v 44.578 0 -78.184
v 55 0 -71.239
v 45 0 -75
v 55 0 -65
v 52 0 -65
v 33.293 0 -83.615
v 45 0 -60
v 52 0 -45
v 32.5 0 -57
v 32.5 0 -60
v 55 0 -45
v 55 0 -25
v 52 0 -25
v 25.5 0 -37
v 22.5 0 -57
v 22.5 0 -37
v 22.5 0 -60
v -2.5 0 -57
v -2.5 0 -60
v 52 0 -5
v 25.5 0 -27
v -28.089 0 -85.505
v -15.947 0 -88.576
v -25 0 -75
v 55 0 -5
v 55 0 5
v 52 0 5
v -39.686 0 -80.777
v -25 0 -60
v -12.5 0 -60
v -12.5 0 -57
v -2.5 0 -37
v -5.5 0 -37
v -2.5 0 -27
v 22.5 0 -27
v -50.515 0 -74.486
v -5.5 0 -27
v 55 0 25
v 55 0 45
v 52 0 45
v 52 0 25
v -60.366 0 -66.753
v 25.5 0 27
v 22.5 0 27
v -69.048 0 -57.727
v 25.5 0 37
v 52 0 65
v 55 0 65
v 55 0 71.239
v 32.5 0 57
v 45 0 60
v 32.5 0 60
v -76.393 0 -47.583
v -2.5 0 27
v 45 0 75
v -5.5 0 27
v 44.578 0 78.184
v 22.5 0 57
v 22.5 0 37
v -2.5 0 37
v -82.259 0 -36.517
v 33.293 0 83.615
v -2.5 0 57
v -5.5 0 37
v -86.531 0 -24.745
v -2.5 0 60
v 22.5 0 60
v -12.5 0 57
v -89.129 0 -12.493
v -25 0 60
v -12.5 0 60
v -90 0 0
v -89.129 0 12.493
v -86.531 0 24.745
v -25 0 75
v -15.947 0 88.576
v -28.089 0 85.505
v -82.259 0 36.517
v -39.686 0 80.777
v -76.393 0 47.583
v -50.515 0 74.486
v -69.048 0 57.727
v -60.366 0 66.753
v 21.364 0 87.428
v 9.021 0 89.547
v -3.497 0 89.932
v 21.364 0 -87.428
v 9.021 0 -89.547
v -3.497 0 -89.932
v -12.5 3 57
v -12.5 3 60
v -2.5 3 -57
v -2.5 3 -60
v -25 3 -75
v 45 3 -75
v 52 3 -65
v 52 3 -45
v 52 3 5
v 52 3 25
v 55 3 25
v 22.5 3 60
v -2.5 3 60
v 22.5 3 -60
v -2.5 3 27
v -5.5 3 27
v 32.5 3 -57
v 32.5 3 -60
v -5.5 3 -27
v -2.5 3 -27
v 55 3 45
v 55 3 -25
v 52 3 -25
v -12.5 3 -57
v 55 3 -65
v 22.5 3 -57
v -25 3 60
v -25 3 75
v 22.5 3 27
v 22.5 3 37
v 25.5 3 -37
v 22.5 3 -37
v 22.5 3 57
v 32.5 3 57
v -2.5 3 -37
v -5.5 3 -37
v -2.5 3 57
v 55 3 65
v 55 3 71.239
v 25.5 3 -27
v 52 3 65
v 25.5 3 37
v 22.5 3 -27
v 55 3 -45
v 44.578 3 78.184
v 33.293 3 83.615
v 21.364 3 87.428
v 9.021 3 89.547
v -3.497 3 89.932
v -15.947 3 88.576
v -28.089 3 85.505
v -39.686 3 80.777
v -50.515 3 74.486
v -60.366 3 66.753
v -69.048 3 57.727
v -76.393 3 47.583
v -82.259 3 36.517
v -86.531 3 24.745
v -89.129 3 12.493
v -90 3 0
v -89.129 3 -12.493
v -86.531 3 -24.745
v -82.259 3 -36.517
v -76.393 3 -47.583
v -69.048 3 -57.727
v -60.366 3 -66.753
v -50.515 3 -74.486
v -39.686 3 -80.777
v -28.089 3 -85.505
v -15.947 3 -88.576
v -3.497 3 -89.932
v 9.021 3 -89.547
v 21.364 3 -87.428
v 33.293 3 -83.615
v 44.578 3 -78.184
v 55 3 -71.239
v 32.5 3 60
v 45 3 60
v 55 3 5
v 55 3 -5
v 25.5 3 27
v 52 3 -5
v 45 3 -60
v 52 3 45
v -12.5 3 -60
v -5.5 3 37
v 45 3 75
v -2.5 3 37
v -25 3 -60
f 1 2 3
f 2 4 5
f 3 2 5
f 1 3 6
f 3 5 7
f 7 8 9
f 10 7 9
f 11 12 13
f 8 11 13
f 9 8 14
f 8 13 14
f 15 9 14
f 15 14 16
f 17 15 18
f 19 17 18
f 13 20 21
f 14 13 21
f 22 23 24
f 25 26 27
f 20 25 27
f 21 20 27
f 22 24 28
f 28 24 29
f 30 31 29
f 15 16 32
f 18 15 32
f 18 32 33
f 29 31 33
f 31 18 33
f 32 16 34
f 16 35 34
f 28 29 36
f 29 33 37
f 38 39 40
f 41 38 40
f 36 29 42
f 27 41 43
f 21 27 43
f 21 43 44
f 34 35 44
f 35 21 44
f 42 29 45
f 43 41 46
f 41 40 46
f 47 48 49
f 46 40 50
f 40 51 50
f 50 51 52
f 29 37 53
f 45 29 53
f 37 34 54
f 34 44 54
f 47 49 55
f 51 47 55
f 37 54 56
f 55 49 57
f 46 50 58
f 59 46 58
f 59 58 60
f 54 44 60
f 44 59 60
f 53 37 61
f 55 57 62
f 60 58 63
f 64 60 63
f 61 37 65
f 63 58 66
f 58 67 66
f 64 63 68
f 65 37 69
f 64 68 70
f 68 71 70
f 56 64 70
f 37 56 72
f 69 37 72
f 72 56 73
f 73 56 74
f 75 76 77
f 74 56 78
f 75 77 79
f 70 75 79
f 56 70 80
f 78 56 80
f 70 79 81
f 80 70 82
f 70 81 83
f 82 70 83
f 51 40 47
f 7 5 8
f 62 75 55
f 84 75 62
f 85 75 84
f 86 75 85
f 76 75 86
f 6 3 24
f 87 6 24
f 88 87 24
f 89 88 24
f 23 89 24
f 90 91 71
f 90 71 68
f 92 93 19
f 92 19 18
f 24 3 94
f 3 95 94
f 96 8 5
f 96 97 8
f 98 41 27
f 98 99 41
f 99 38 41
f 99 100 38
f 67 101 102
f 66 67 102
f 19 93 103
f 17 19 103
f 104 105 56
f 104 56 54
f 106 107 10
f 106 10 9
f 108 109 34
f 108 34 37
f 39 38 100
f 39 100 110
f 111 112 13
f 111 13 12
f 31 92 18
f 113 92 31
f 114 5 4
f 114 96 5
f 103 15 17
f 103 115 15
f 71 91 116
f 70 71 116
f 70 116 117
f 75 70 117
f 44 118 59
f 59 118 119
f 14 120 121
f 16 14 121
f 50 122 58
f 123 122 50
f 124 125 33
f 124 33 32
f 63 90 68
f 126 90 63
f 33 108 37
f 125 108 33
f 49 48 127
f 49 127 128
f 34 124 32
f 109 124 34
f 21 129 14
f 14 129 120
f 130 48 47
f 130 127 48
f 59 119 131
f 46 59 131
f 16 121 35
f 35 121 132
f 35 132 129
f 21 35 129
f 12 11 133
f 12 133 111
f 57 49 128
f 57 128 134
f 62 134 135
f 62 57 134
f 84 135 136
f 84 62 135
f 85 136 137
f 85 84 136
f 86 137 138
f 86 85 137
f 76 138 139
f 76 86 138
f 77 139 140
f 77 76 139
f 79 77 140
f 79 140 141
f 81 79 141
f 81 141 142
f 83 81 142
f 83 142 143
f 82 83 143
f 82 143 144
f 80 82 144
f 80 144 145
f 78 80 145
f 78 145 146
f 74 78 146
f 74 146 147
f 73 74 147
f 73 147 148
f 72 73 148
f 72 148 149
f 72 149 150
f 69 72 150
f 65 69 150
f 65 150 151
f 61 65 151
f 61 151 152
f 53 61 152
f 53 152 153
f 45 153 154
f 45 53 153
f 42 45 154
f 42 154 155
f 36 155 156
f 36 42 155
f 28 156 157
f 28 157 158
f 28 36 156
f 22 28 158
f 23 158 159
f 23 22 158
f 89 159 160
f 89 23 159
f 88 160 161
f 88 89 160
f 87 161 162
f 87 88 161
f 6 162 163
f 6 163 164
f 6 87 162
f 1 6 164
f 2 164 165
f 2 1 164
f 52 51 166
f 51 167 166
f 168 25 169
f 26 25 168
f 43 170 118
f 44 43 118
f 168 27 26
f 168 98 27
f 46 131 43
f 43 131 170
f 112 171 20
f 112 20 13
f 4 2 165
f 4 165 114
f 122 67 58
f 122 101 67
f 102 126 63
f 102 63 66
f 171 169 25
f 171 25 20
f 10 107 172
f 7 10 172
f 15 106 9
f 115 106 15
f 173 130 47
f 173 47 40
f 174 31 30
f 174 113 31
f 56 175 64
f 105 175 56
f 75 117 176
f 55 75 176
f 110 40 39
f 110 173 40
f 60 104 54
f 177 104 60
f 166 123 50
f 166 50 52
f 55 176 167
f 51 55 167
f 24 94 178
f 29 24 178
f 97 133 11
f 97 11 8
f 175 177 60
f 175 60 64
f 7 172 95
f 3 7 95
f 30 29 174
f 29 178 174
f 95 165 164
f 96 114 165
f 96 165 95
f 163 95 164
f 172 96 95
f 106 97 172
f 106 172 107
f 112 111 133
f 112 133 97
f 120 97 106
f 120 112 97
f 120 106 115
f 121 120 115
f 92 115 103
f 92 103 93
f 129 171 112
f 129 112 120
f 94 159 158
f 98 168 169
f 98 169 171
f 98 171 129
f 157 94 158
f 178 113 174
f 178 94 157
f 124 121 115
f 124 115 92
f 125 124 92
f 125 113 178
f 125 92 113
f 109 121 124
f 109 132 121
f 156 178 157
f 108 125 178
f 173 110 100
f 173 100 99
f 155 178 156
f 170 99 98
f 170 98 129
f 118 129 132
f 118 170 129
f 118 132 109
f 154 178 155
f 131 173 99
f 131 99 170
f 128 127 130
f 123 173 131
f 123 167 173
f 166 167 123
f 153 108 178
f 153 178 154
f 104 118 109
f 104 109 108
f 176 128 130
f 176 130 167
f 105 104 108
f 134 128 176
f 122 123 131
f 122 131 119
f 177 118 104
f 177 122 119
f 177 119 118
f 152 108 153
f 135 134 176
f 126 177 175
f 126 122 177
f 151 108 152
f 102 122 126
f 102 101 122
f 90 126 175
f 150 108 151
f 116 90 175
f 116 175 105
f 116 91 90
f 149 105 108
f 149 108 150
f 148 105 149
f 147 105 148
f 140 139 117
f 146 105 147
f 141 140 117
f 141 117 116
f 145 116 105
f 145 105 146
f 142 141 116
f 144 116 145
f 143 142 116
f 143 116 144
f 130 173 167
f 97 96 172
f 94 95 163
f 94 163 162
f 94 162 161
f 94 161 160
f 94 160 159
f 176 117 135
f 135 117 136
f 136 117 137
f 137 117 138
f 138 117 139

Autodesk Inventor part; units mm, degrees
ref_plane "YZ Plane" through (0, 0, 0) normal (1, 0, 0) x (0, 1, 0)
ref_plane "XZ Plane" through (0, 0, 0) normal (0, 1, 0) x (-1, 0, 0)
ref_plane "XY Plane" through (0, 0, 0) normal (0, 0, 1) x (1, 0, 0)
sketch "Sketch1" plane through (0, 0, 0) normal (0, 1, 0) x (-1, 0, 0)
  circle A0 centre (0, 0) radius 90 construction
  line L0 (-55, 71.239) -> (-55, -71.239) construction
  line L1 (-45, 75) -> (25, 75) construction
  line L2 (25, 75) -> (25, 60) construction
  line L3 (25, 60) -> (-45, 60) construction
  line L4 (-45, 60) -> (-45, 75) construction
  line L5 (-55, 0) -> (0, 0) construction
  circle A1 centre (0, 0) radius 90 construction
  line L6 (-45, -75) -> (25, -75) construction
  line L7 (25, -75) -> (25, -60) construction
  line L8 (25, -60) -> (-45, -60) construction
  line L9 (-45, -60) -> (-45, -75) construction
  line L10 (-10, 60) -> (-10, -60) construction
  dimension "d0" = 180
  dimension "d1" = 55
  dimension "d2" = 70
  dimension "d3" = 60
  dimension "d4" = 10
  dimension "d5" = 15
sketch "Sketch2" plane through (0, 0, 0) normal (0, 1, 0) x (-1, 0, 0)
  circle A0 centre (0, 0) radius 90
  line L0 (-55, -71.239) -> (-55, 71.239)
  dimension "d6" = 180
  dimension "d7" = 55
extrude "Extrusion1" add sketch "Sketch2" along normal blind 3 contours A0 L0 picked at (-6.6667, 0)
sketch "Sketch3" plane through (0, 3, 0) normal (0, 1, 0) x (1, 0, 0)
  line L0 (-25, -60) -> (45, -60) construction
  line L1 (45, -60) -> (45, -75) construction
  line L2 (-25, -75) -> (-25, -60) construction
  line L3 (45, -75) -> (-25, -75) construction
  line L4 (45, -60) -> (-25, -60)
  line L5 (-25, -60) -> (-25, -75)
  line L6 (-25, -75) -> (45, -75)
  line L7 (45, -75) -> (45, -60)
  point P0 (0, 0)
extrude "Extrusion2" cut sketch "Sketch3" against normal blind 3
mirror "Mirror1" about plane through (0, 0, 0) normal (0, 0, 1) of "Extrusion2"
sketch "Sketch4" plane through (0, 3, 0) normal (0, 1, 0) x (1, 0, 0)
  line L0 (10, -60) -> (10, 60)
  line L1 (22.5, -5) -> (-2.5, -5) construction
  line L2 (-2.5, -5) -> (-2.5, -57) construction
  line L3 (-2.5, -57) -> (22.5, -57) construction
  line L4 (22.5, -57) -> (22.5, -5) construction
  line L5 (22.5, -5) -> (-2.5, -57) construction
  line L6 (-2.5, -5) -> (22.5, -57) construction
  line L7 (-25, -60) -> (45, -60) construction
  line L8 (45, 60) -> (-25, 60) construction
  line L9 (45, -60) -> (-25, -60) projected
  line L10 (-2.5, -60) -> (-12.5, -60)
  line L11 (-12.5, -60) -> (-12.5, -57)
  line L12 (-12.5, -57) -> (-2.5, -57)
  line L13 (-2.5, -57) -> (-2.5, -60)
  line L14 (22.5, -57) -> (32.5, -57)
  line L15 (32.5, -57) -> (32.5, -60)
  line L16 (32.5, -60) -> (22.5, -60)
  line L17 (22.5, -60) -> (22.5, -57)
  line L18 (-2.5, -37) -> (-5.5, -37)
  line L19 (-5.5, -37) -> (-5.5, -27)
  line L20 (-5.5, -27) -> (-2.5, -27)
  line L21 (-2.5, -27) -> (-2.5, -37)
  line L22 (22.5, -37) -> (25.5, -37)
  line L23 (25.5, -37) -> (25.5, -27)
  line L24 (25.5, -27) -> (22.5, -27)
  line L25 (22.5, -27) -> (22.5, -37)
  point P0 (0, 0)
  point P1 (10, -31)
  dimension "d12" = 25
  dimension "d13" = 52
  dimension "d14" = 3
  dimension "d15" = 10
  dimension "d16" = 10
  dimension "d17" = 3
  dimension "d18" = 10
  dimension "d19" = 20
  dimension "d20" = 3
  dimension "d21" = 10
extrude "Extrusion3" cut sketch "Sketch4" against normal blind 3
sketch "Sketch5" plane through (0, 3, 0) normal (0, 1, 0) x (1, 0, 0)
  line L0 (55, -71.239) -> (55, 71.239) projected
  line L1 (55, -65) -> (52, -65)
  line L2 (52, -65) -> (52, -45)
  line L3 (52, -45) -> (55, -45)
  line L4 (55, -45) -> (55, -65)
  line L5 (55, -25) -> (52, -25)
  line L6 (52, -25) -> (52, -5)
  line L7 (52, -5) -> (55, -5)
  line L8 (55, -5) -> (55, -25)
  point P0 (0, 0)
  dimension "d24" = 3
  dimension "d25" = 20
  dimension "d26" = 20
  dimension "d27" = 20
  dimension "d28" = 5
extrude "Extrusion4" cut sketch "Sketch5" against normal blind 3
mirror "Mirror2" about plane through (0, 0, 0) normal (0, 0, 1) of "Extrusion3", "Extrusion4"
properties part number "BasePlate"
